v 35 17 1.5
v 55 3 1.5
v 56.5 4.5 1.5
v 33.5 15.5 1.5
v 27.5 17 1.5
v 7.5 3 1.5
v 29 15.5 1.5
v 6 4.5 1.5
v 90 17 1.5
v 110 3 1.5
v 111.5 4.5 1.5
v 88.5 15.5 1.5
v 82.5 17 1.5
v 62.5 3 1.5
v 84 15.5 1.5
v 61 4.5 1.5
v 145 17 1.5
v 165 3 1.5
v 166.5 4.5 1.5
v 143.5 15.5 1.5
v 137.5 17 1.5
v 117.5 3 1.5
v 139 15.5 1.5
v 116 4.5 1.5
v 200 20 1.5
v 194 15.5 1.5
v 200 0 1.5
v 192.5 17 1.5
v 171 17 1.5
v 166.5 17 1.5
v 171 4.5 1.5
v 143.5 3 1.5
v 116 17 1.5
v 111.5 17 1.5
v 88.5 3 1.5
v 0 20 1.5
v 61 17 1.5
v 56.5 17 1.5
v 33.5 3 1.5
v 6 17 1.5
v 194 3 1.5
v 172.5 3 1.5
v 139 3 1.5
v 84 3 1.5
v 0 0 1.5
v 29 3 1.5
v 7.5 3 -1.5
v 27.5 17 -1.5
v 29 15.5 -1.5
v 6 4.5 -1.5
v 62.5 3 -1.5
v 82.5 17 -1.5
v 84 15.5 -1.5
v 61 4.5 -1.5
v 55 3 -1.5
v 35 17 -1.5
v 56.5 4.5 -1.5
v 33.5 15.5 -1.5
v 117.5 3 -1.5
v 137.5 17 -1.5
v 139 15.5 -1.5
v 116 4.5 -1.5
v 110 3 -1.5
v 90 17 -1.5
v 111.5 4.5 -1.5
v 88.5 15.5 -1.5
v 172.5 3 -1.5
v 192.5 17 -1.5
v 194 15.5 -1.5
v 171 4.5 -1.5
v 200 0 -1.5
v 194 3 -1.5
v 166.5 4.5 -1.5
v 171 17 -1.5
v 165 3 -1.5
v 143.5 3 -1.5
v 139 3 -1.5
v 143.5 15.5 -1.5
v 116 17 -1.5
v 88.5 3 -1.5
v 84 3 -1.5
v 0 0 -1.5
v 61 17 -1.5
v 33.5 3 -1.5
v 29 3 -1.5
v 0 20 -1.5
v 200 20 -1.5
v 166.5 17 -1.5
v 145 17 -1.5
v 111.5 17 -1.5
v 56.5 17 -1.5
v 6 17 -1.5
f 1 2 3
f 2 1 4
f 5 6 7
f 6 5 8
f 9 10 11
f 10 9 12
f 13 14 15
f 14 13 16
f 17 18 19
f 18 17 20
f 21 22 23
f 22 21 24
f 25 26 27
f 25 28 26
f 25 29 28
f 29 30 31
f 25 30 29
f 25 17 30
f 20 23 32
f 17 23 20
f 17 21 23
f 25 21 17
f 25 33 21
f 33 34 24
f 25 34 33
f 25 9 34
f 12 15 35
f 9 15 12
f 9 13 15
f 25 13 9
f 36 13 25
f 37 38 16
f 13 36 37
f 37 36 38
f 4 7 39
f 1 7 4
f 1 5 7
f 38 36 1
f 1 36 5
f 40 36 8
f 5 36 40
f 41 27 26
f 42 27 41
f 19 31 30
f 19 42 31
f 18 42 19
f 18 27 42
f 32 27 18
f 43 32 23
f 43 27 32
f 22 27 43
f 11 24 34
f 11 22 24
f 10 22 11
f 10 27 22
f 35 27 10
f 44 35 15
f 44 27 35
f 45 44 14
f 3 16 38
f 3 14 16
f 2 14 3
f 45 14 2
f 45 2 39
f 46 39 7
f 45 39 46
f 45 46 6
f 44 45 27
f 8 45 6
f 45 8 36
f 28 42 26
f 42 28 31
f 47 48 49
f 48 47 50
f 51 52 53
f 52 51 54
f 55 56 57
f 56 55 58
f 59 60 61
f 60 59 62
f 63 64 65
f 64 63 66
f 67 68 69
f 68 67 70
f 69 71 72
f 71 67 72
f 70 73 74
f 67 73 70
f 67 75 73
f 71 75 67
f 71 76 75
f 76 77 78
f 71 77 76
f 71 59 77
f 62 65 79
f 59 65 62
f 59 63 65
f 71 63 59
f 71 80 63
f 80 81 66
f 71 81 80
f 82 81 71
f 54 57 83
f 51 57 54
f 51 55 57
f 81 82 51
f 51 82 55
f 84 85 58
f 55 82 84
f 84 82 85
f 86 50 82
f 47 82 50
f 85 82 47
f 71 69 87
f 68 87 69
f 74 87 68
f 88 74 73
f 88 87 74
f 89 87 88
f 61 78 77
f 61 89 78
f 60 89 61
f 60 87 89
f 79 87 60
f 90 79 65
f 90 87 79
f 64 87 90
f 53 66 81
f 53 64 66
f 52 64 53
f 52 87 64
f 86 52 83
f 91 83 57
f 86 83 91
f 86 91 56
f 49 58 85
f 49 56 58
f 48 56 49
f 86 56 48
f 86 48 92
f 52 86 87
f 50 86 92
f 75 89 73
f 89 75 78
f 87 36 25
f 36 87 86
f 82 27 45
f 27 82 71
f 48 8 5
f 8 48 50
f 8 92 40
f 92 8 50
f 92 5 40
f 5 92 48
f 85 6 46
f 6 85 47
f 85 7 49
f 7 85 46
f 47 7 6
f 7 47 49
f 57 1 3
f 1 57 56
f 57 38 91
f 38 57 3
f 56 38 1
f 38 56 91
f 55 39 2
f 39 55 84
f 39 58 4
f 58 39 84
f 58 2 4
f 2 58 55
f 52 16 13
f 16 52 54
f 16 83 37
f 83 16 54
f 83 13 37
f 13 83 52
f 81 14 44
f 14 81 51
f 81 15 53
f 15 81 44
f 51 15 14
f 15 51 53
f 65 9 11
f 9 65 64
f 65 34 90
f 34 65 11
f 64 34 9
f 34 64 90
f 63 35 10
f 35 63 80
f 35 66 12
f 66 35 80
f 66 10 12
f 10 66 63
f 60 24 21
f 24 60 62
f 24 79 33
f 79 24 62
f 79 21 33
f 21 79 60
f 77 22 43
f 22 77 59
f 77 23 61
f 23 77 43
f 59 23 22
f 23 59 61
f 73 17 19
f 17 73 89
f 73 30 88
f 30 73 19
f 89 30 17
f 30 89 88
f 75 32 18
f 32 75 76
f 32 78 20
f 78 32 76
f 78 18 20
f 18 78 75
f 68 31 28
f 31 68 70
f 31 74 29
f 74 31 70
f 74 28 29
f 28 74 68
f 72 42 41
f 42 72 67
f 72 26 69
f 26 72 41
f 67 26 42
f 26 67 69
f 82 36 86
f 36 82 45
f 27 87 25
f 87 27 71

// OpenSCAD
// file: rotate_copy.scad
module rotate_copy(vector=[0,0,90]){
    children();
    rotate(vector) children();
}
// main file
use <rotate_copy.scad>

l=200;
n=7;
t=3;
w=20;

truss(l,w,n,t);

module truss(l,w,n,t,chamfer=true){
    pitch=(l-2.5*t)/n;
    Lo=pitch+t/2;
    Li=Lo-t;
    Wi=w-2*t;
    translate([t+Lo/2,0,0]){
        for (i=[0:n-1]){   
            translate([i*pitch,0,0]) 
            rotate([0,i*180,0])  
            translate([-Lo/2,0,-t/2]){
                difference(){
                    cube([Lo,w,t]);
                linear_extrude(2*t) polygon([[t,1.5*t],[Li-.5*t,Wi+t],[t,Wi+t]]);
                linear_extrude(2*t) polygon([[1.5*t,t],[Li,t],[Li,Wi+0.5*t]]);
                }
            }
        }
        //Add corner posts
        translate([-(Lo+t)/2,w/2,0]) cube([t,w,t],center=true);
        translate([l-(1.5*t+Lo/2),w/2,0]) cube([t,w,t],center=true);
    }
}
